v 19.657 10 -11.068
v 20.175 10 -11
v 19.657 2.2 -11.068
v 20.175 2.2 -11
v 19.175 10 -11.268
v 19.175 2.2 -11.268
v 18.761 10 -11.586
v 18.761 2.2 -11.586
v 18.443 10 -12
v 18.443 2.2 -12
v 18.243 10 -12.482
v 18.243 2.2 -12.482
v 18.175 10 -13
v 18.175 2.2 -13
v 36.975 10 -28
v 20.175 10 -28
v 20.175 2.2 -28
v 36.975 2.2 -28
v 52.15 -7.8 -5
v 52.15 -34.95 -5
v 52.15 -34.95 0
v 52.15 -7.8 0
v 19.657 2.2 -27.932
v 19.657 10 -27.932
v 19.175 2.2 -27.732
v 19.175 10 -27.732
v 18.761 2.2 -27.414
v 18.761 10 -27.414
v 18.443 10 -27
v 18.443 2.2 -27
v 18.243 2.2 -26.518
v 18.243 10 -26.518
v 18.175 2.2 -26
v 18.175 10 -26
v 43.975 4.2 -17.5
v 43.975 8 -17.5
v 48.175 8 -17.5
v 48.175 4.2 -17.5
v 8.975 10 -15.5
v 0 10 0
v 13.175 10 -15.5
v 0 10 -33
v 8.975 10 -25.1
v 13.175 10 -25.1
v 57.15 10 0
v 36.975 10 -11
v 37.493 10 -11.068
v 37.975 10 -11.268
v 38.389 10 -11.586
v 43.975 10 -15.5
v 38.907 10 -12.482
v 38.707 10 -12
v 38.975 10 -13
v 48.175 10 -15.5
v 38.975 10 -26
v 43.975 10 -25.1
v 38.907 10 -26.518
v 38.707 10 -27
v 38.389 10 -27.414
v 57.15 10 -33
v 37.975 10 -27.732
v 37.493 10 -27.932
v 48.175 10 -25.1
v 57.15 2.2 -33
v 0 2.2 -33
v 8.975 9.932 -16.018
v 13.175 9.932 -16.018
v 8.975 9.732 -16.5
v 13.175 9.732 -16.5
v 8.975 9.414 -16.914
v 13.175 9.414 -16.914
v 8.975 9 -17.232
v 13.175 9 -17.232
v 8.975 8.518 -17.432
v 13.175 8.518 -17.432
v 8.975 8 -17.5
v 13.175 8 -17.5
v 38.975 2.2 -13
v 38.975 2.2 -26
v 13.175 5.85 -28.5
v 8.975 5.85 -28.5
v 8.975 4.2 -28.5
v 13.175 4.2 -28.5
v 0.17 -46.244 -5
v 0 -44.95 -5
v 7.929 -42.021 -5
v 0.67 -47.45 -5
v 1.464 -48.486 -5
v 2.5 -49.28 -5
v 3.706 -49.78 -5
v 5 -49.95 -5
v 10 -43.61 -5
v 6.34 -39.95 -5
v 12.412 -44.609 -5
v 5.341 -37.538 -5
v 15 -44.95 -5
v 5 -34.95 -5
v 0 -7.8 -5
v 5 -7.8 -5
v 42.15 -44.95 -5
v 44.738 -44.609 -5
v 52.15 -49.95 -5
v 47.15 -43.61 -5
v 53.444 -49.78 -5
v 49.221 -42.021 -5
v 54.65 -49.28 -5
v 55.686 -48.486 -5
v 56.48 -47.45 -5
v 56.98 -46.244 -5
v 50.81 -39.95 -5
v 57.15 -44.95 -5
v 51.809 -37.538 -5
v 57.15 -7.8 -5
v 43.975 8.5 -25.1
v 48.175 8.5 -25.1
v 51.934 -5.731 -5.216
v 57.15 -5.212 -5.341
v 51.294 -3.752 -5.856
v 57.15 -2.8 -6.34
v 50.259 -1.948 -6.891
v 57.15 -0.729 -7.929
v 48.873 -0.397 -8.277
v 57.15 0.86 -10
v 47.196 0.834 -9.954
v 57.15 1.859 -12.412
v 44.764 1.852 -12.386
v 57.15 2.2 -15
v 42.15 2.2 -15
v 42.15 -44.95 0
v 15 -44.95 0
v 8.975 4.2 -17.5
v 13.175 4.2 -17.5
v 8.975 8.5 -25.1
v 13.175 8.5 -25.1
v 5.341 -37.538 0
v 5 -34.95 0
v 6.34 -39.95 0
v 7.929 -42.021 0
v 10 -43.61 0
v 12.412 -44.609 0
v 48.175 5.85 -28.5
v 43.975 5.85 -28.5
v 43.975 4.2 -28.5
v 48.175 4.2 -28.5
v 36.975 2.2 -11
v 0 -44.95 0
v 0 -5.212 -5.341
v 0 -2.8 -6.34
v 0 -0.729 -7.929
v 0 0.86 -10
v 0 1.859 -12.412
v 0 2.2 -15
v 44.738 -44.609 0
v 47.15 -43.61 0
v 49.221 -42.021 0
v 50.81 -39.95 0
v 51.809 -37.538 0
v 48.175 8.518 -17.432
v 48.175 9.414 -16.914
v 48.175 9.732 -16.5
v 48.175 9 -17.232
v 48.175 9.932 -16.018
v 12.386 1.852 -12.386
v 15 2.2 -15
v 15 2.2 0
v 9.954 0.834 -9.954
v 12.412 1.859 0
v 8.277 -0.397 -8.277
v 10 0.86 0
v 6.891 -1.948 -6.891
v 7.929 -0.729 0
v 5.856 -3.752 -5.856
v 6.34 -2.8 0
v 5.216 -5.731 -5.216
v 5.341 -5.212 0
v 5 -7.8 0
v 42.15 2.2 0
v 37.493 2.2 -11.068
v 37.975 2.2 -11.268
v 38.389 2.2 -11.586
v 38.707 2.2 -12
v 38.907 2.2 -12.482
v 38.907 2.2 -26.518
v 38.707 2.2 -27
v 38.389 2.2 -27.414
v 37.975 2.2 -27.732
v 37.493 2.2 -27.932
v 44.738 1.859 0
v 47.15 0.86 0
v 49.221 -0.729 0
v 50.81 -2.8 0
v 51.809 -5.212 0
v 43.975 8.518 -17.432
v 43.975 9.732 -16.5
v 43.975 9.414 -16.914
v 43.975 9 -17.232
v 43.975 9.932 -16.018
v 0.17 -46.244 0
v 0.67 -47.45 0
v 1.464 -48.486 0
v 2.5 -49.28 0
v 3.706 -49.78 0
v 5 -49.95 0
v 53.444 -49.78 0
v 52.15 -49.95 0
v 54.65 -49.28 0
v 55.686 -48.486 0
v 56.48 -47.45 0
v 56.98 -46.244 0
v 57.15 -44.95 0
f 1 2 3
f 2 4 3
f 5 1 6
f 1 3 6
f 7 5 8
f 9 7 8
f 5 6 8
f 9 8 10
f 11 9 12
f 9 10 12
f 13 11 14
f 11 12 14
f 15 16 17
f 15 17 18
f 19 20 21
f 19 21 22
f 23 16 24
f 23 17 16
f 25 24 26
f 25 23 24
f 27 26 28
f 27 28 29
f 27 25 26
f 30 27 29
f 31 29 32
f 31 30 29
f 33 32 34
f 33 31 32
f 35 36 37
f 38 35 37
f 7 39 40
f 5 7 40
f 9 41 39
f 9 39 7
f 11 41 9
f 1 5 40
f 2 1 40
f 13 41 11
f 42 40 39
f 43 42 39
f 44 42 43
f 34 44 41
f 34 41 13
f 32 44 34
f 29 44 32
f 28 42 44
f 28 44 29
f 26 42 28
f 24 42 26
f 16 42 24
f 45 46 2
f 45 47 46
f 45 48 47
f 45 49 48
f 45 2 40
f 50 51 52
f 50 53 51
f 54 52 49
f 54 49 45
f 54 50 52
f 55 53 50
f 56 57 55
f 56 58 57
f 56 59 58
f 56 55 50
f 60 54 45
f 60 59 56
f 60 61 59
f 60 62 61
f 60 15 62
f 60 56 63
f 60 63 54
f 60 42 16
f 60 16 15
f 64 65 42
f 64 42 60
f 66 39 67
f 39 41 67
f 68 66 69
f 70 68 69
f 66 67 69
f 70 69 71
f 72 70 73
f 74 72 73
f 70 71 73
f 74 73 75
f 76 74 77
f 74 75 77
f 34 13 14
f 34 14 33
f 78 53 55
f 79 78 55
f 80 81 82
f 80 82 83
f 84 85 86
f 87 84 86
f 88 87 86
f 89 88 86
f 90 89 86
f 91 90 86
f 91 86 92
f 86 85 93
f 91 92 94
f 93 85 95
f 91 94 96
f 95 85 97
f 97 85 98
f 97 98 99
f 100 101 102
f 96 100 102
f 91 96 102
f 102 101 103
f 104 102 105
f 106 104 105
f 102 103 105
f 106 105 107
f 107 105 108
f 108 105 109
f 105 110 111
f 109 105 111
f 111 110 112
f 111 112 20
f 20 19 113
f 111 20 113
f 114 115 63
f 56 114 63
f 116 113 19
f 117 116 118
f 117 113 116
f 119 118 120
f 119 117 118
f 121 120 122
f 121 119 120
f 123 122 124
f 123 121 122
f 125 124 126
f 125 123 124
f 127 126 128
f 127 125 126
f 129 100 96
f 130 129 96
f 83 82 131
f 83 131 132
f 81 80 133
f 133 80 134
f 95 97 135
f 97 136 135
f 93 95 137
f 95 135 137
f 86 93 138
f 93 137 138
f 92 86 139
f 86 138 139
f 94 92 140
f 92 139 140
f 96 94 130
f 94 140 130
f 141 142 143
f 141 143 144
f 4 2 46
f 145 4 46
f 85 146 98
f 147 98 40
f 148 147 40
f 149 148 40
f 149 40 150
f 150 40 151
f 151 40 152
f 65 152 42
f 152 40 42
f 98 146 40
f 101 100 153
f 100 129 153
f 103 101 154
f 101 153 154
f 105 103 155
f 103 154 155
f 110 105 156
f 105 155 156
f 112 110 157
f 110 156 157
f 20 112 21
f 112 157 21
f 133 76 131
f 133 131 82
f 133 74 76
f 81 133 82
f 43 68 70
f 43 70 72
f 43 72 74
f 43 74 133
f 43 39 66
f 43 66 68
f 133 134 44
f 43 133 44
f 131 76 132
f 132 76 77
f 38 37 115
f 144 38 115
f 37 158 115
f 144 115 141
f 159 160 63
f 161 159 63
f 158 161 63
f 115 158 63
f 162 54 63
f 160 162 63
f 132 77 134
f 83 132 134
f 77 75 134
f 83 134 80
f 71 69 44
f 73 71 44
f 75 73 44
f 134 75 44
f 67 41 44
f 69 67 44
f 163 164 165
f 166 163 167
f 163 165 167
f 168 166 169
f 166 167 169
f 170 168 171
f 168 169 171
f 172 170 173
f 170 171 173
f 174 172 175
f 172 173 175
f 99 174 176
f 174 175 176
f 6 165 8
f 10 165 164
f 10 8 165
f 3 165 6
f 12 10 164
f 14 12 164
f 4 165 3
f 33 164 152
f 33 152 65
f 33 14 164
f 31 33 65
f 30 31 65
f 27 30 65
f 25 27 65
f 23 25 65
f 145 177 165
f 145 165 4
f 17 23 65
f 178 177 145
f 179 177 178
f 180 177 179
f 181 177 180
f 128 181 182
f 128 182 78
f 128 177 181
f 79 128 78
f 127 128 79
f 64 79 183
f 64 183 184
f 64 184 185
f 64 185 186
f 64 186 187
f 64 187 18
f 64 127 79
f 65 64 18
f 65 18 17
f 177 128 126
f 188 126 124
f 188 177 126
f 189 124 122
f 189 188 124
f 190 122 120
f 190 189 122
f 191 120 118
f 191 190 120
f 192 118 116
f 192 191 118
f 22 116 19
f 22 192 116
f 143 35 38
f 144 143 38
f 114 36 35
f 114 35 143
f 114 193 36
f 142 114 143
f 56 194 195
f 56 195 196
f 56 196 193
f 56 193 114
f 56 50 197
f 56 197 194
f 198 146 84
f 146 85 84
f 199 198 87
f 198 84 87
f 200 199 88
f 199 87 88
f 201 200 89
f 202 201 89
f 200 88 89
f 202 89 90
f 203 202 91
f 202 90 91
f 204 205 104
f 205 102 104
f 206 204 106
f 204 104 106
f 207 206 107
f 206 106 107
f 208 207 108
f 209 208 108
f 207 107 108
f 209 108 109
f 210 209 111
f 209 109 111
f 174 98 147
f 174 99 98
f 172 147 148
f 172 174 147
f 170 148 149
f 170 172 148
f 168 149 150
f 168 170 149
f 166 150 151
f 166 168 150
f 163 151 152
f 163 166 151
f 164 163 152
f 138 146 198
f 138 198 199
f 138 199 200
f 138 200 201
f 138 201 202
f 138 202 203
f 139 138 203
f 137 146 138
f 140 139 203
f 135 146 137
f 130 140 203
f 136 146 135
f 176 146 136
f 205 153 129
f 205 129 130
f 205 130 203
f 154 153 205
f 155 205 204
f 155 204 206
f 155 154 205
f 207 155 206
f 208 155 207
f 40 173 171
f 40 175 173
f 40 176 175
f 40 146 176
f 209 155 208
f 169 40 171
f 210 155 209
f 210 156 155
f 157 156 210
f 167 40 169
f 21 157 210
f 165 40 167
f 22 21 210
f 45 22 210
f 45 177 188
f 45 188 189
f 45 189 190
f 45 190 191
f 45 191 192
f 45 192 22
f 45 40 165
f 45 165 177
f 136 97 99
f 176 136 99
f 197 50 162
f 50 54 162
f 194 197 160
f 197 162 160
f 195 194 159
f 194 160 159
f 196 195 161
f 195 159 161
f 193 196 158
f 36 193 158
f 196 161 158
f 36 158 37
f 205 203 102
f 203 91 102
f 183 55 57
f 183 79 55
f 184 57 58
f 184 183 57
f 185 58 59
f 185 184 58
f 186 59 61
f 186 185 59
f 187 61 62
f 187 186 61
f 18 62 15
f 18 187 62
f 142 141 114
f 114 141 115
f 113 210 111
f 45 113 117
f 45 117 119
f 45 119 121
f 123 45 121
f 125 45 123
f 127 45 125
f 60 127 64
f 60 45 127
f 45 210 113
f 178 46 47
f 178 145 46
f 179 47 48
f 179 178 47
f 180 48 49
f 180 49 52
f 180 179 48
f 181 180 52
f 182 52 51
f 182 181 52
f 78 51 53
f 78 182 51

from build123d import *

# Parameters (mm, degrees)
SKETCH1_W               = 57.15
SKETCH1_H               = 33
BOSS_EXTRUDE1_DEPTH     = 10
SKETCH2_W               = 4.2
SKETCH2_H               = 11
CUT_EXTRUDE1_DEPTH      = 5.8
BOSS_EXTRUDE2_START     = -43.975
BOSS_EXTRUDE2_DEPTH     = 55.8
SKETCH4_W               = 33
SKETCH4_H               = 2.2
CUT_EXTRUDE2_DEPTH      = 1
CUT_EXTRUDE2_DEPTH_BACK = 58.15
FILLET1_R               = 2
SKETCH7_W               = 20.8
SKETCH7_H               = 17
CUT_EXTRUDE4_DEPTH      = 16
FILLET2_R               = 2
BOSS_EXTRUDE4_START     = -7.8
SKETCH5_W               = 57.15
SKETCH5_H               = 5
BOSS_EXTRUDE4_DEPTH     = 52.15
SKETCH8_W               = 47.15
SKETCH8_H               = 47.15
CUT_EXTRUDE5_DEPTH      = 52.15
FILLET3_R               = 10
FILLET4_R               = 5


with BuildPart() as part:
    # Sketch1 → Boss-Extrude1 (new body)
    with BuildSketch(Plane(origin=(0, 0, 0), x_dir=(1, 0, 0), z_dir=(0, 1, 0))):
        with Locations((28.575, 16.5)):
            Rectangle(SKETCH1_W, SKETCH1_H)
    extrude(amount=BOSS_EXTRUDE1_DEPTH)

    # Sketch2 → Cut-Extrude1 (cut)
    with BuildSketch(Plane(origin=(0, 10, 0), x_dir=(1, 0, 0), z_dir=(0, 1, 0))):
        with Locations((11.075, 23)):
            Rectangle(SKETCH2_W, SKETCH2_H)
        with Locations((46.075, 23)):
            Rectangle(SKETCH2_W, SKETCH2_H)
    extrude(amount=-CUT_EXTRUDE1_DEPTH, mode=Mode.SUBTRACT)

    # Sketch3 → Boss-Extrude2 (add)
    with BuildSketch(Plane.ZY.offset(-13.175).offset(BOSS_EXTRUDE2_START)):
        Polygon((-28.5, 5.85), (-25.1, 8.5), (-25.1, 10), (-28.5, 10), align=None)
    extrude(amount=BOSS_EXTRUDE2_DEPTH)

    # Sketch4 → Cut-Extrude2 (cut, two sides)
    with BuildSketch(Plane(origin=(57.15, 0, 0), x_dir=(0, 0, -1), z_dir=(1, 0, 0))) as cut_extrude2_sk:
        with Locations((16.5, 1.1)):
            Rectangle(SKETCH4_W, SKETCH4_H)
    extrude(amount=CUT_EXTRUDE2_DEPTH, mode=Mode.SUBTRACT)
    extrude(cut_extrude2_sk.sketch, amount=-CUT_EXTRUDE2_DEPTH_BACK, mode=Mode.SUBTRACT)

    # Fillet1
    fillet1_edges = [part.edges().sort_by_distance(p)[0] for p in [
        (11.075, 10, -17.5),
        (46.075, 10, -17.5),
    ]]
    fillet(fillet1_edges, radius=FILLET1_R)

    # Sketch7 → Cut-Extrude4 (cut)
    with BuildSketch(Plane(origin=(0, 10, 0), x_dir=(1, 0, 0), z_dir=(0, 1, 0))):
        with Locations((28.575, 19.5)):
            Rectangle(SKETCH7_W, SKETCH7_H)
    extrude(amount=-CUT_EXTRUDE4_DEPTH, mode=Mode.SUBTRACT)

    # Fillet2
    fillet2_edges = [part.edges().sort_by_distance(p)[0] for p in [
        (18.175, 6.1, -11),
        (18.175, 6.1, -28),
        (38.975, 6.1, -28),
        (38.975, 6.1, -11),
    ]]
    fillet(fillet2_edges, radius=FILLET2_R)

    # Sketch5 → Boss-Extrude4 (add)
    with BuildSketch(Plane(origin=(0, 10, 0), x_dir=(1, 0, 0), z_dir=(0, 1, 0)).offset(BOSS_EXTRUDE4_START)):
        with Locations((28.575, 2.5)):
            Rectangle(SKETCH5_W, SKETCH5_H)
    extrude(amount=-BOSS_EXTRUDE4_DEPTH)

    # Sketch8 → Cut-Extrude5 (cut)
    with BuildSketch(Plane(origin=(0, 0, -5), x_dir=(-1, 0, 0), z_dir=(0, 0, -1))):
        with Locations((-28.575, -21.375)):
            Rectangle(SKETCH8_W, SKETCH8_H)
    extrude(amount=-CUT_EXTRUDE5_DEPTH, mode=Mode.SUBTRACT)

    # Fillet3
    fillet3_edges = [part.edges().sort_by_distance(p)[0] for p in [
        (54.65, 2.2, -5),
        (2.5, 2.2, -5),
        (52.15, -44.95, -2.5),
        (52.15, 2.2, -2.5),
        (5, 2.2, -2.5),
        (5, -44.95, -2.5),
    ]]
    fillet(fillet3_edges, radius=FILLET3_R)

    # Fillet4
    fillet4_edges = [part.edges().sort_by_distance(p)[0] for p in [
        (57.15, -49.95, -2.5),
        (0, -49.95, -2.5),
    ]]
    fillet(fillet4_edges, radius=FILLET4_R)


solid = part.part
